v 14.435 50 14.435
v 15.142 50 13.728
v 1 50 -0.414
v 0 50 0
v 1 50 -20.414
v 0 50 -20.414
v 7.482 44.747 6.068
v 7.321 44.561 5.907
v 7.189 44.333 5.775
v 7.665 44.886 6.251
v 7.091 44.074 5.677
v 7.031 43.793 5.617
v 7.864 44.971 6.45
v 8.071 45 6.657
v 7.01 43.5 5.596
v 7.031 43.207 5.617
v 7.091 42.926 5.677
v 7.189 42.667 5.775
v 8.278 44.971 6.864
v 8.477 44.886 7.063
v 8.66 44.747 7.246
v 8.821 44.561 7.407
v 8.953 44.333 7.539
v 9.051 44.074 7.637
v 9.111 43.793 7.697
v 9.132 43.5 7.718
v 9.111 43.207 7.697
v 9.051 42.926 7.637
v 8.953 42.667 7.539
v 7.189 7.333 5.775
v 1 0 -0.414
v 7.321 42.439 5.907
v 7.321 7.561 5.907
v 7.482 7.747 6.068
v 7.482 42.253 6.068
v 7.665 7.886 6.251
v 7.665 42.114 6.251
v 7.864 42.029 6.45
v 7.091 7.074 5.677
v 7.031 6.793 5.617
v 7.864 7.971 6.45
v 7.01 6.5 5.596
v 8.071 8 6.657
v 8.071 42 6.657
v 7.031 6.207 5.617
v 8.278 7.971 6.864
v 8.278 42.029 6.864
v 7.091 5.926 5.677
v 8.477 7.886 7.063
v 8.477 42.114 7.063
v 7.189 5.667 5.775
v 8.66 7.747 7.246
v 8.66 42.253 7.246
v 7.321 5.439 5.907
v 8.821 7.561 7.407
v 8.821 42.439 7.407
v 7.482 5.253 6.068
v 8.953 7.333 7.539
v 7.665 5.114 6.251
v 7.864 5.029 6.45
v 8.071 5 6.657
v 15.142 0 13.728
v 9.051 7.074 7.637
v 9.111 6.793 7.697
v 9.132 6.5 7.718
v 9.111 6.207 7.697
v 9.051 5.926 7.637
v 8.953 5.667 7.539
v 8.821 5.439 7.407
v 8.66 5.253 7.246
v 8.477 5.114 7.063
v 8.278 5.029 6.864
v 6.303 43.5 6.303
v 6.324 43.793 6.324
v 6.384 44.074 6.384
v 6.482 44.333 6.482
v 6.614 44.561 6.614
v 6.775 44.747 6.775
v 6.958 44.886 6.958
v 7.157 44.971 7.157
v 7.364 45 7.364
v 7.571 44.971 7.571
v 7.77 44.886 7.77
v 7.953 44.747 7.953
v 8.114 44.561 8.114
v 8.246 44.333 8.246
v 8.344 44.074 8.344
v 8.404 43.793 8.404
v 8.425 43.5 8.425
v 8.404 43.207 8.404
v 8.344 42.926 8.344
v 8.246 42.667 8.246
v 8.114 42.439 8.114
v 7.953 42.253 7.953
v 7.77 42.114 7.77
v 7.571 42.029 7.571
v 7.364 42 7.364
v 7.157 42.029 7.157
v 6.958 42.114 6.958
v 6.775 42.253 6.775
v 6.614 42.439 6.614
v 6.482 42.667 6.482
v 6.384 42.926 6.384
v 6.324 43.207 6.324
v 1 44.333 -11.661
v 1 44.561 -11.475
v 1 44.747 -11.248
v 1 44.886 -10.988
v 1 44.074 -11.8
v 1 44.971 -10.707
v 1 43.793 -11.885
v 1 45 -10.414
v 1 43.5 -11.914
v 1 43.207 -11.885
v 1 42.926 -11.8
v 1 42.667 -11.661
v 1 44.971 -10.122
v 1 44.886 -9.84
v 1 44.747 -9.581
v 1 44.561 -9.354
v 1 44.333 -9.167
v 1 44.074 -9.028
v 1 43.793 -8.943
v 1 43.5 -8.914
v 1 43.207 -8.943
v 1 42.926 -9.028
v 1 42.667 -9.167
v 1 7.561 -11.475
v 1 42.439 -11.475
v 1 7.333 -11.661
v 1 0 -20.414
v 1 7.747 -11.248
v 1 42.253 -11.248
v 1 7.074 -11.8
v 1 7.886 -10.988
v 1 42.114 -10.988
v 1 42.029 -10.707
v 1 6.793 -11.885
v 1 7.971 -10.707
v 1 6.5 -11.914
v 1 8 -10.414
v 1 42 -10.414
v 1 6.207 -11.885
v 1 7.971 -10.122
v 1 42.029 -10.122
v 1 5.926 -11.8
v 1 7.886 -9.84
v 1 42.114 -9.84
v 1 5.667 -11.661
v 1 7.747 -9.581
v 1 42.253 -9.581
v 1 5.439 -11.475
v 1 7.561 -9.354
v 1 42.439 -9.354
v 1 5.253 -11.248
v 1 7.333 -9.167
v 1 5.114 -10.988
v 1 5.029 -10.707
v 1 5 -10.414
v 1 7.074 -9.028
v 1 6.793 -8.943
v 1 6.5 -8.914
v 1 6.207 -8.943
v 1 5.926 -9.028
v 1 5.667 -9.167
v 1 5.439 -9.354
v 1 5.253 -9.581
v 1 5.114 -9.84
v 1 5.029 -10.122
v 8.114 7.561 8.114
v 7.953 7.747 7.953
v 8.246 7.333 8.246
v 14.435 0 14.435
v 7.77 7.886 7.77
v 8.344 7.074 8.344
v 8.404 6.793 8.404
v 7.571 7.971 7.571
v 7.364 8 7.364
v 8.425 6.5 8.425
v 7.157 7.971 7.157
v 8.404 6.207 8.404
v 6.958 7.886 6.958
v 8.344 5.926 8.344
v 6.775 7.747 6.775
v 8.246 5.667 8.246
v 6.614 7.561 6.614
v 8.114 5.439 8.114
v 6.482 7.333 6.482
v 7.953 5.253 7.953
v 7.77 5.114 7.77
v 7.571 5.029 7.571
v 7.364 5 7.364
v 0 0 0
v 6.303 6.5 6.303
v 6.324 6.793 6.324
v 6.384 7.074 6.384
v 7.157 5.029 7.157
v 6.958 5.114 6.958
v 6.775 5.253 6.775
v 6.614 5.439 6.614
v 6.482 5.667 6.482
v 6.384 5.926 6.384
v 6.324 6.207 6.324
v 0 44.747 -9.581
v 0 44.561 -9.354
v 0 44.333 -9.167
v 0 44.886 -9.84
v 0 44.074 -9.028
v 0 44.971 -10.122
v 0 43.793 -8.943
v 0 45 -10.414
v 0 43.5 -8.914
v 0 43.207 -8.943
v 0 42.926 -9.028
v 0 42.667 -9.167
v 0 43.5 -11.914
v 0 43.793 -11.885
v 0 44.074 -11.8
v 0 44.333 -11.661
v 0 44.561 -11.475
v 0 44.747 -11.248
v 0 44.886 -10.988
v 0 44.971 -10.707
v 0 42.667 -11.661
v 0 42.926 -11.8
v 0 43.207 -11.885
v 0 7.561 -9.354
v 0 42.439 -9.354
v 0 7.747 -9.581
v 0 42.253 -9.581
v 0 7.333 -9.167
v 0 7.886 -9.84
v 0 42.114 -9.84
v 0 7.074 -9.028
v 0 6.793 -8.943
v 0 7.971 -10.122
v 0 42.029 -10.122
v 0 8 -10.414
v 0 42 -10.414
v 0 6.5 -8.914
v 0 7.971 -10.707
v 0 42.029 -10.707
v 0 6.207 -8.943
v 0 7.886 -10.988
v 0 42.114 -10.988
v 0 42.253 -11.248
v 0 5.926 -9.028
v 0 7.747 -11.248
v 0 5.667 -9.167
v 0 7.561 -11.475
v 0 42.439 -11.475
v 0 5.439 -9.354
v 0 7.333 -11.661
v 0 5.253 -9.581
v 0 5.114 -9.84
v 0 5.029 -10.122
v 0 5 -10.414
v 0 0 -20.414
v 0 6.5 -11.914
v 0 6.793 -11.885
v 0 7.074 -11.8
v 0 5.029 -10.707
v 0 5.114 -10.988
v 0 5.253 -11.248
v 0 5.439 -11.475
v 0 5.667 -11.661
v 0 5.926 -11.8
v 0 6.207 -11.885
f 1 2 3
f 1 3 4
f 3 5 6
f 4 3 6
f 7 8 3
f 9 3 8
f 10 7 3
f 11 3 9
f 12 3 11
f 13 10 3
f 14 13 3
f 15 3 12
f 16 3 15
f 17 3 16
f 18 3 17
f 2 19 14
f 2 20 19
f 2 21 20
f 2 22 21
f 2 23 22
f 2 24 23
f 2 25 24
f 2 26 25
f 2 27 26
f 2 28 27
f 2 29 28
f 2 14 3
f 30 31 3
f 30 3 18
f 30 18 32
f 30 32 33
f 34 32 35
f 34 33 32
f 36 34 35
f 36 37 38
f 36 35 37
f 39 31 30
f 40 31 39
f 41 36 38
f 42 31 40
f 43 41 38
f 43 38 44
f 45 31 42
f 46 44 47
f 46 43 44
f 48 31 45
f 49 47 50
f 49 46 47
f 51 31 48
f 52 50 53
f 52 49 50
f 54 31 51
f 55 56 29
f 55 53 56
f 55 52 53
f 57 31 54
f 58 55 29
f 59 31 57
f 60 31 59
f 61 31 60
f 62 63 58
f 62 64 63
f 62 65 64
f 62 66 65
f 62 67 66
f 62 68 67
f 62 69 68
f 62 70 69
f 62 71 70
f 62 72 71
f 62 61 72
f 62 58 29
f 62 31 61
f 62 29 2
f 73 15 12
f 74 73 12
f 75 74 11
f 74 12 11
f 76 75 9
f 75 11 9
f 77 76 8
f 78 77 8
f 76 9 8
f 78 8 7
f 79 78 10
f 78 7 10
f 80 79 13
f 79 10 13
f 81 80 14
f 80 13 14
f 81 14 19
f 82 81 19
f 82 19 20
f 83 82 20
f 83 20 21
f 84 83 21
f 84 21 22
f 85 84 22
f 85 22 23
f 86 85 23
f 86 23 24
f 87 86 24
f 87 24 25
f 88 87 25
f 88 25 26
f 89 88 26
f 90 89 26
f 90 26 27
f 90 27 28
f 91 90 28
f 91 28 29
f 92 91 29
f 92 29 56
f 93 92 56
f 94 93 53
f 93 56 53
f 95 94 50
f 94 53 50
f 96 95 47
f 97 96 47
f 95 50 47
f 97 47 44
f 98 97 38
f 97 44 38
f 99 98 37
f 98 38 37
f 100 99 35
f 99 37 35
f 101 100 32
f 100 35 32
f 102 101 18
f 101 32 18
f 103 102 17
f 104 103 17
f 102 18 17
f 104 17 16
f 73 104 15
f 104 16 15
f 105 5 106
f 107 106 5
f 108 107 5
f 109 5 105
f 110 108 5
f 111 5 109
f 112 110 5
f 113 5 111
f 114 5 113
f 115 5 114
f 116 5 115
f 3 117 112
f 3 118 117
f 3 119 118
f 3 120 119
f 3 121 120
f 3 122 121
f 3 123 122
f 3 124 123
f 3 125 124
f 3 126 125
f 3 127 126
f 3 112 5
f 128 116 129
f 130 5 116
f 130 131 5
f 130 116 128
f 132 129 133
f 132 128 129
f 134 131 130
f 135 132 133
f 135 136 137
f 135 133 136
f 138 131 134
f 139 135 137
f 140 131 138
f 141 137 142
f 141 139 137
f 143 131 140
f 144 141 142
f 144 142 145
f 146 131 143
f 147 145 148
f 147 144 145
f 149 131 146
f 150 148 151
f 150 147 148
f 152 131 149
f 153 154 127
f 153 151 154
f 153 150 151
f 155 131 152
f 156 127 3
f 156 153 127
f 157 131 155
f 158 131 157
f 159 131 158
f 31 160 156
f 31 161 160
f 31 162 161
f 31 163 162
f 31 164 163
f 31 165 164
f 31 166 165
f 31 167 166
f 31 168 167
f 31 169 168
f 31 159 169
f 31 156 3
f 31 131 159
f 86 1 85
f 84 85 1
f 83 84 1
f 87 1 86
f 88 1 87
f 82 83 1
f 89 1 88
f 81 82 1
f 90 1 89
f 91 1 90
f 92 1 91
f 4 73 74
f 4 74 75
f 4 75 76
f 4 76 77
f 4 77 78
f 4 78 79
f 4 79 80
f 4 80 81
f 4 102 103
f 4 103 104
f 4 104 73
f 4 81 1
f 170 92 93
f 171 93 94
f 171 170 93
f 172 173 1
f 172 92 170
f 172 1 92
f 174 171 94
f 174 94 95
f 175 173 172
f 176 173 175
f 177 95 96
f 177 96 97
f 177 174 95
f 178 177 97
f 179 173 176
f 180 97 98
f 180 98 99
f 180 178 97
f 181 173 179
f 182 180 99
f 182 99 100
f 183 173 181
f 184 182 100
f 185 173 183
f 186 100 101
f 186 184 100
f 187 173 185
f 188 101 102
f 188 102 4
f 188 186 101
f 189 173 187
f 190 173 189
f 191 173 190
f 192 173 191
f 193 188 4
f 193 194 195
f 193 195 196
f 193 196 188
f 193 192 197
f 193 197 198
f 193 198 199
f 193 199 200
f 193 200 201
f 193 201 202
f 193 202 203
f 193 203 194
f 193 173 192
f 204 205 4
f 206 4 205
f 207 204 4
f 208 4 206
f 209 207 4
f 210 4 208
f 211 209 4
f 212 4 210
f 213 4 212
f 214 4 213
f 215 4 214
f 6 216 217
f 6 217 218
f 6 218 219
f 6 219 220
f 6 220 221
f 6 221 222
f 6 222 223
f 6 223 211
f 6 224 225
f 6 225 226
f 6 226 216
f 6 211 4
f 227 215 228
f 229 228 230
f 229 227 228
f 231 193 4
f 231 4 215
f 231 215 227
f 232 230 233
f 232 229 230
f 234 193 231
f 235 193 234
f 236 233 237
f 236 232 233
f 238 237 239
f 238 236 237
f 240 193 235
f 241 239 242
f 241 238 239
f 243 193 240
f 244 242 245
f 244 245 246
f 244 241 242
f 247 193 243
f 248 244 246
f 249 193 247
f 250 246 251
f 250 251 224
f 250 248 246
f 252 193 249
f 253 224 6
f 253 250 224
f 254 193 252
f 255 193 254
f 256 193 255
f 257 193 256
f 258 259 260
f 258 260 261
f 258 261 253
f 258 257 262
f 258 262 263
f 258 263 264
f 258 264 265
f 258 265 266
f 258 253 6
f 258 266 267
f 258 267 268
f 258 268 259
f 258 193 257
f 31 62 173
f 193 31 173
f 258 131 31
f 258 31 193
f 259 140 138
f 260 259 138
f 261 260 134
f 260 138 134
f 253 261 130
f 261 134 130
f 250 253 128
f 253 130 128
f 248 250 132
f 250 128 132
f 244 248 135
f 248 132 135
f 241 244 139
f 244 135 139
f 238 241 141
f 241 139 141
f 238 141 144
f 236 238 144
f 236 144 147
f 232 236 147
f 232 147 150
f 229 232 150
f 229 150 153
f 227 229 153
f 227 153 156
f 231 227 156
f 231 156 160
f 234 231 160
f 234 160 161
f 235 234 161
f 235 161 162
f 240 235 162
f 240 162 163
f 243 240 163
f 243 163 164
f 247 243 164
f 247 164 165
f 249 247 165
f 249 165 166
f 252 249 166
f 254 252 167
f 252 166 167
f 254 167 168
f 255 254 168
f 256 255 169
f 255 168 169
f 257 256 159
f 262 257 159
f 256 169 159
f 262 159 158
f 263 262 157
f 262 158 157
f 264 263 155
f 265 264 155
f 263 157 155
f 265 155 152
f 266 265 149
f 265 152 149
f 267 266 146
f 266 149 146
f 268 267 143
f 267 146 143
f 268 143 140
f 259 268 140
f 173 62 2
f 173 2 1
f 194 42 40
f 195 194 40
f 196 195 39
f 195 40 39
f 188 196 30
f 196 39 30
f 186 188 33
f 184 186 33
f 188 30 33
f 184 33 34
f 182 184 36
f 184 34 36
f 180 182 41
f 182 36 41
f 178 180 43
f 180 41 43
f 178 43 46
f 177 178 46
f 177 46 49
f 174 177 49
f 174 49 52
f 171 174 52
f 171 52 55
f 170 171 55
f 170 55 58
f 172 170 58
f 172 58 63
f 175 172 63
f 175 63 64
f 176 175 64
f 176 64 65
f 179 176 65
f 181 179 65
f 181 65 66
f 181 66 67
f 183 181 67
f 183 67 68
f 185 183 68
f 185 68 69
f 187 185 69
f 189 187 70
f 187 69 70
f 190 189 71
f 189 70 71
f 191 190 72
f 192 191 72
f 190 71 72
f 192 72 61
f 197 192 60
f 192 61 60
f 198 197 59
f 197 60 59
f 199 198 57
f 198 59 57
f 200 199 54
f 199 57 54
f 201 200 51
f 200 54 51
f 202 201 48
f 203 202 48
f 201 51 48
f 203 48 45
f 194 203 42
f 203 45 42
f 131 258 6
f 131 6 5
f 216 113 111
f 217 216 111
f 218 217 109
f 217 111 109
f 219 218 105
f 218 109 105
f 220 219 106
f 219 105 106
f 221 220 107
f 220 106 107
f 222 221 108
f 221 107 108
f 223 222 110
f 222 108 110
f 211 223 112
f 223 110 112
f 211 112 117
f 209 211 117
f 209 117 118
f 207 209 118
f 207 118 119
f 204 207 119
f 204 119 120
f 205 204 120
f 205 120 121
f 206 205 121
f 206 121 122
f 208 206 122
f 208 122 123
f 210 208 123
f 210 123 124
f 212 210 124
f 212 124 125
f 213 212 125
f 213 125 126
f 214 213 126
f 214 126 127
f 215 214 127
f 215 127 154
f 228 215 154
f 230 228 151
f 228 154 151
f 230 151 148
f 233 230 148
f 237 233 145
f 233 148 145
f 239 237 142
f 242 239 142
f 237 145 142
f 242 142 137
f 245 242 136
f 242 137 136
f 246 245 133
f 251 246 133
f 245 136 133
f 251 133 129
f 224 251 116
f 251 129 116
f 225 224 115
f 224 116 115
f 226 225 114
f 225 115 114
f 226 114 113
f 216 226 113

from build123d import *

# Parameters (mm, degrees)
EXTRUSION1_DEPTH = 50
EXTRUSION2_REACH = 3
ESQUISSE2_R      = 1.5
EXTRUSION3_REACH = 13.207
ESQUISSE3_R      = 1.5


with BuildPart() as part:
    # Esquisse1 → Extrusion1 (new body)
    with BuildSketch(Plane(origin=(0, 0, 0), x_dir=(1, 0, 0), z_dir=(0, 1, 0))):
        Polygon((0, 0), (0, 20.414213562), (1, 20.414213562), (1, 0.414213562), (15.142135624, -13.727922061), (14.435028843, -14.435028843), align=None)
    extrude(amount=EXTRUSION1_DEPTH)

    # Esquisse2 → Extrusion2 (cut, up to next)
    with BuildSketch(Plane(origin=(1, 0, 0), x_dir=(0, 0, -1), z_dir=(1, 0, 0)), mode=Mode.PRIVATE) as extrusion2_sk1:
        with Locations((10.414213562, 6.5)):
            Circle(ESQUISSE2_R)
    extrusion2_tool1 = extrude(extrusion2_sk1.sketch, amount=-EXTRUSION2_REACH, mode=Mode.PRIVATE) & part.part
    add(extrusion2_tool1.solids().sort_by_distance((1, 6.5, -10.414214))[0], mode=Mode.SUBTRACT)
    # Esquisse2 → Extrusion2 (cut, up to next)
    with BuildSketch(Plane(origin=(1, 0, 0), x_dir=(0, 0, -1), z_dir=(1, 0, 0)), mode=Mode.PRIVATE) as extrusion2_sk2:
        with Locations((10.414213562, 43.5)):
            Circle(ESQUISSE2_R)
    extrusion2_tool2 = extrude(extrusion2_sk2.sketch, amount=-EXTRUSION2_REACH, mode=Mode.PRIVATE) & part.part
    add(extrusion2_tool2.solids().sort_by_distance((1, 43.5, -10.414214))[0], mode=Mode.SUBTRACT)

    # Esquisse3 → Extrusion3 (cut, up to next)
    with BuildSketch(Plane(origin=(0.707106781, 0, -0.707106781), x_dir=(-0.707106781, 0, -0.707106781), z_dir=(0.707106781, 0, -0.707106781)), mode=Mode.PRIVATE) as extrusion3_sk1:
        with Locations((-10.414213562, 43.5)):
            Circle(ESQUISSE3_R)
    extrusion3_tool1 = extrude(extrusion3_sk1.sketch, amount=-EXTRUSION3_REACH, mode=Mode.PRIVATE) & part.part
    add(extrusion3_tool1.solids().sort_by_distance((8.071068, 43.5, 6.656854))[0], mode=Mode.SUBTRACT)
    # Esquisse3 → Extrusion3 (cut, up to next)
    with BuildSketch(Plane(origin=(0.707106781, 0, -0.707106781), x_dir=(-0.707106781, 0, -0.707106781), z_dir=(0.707106781, 0, -0.707106781)), mode=Mode.PRIVATE) as extrusion3_sk2:
        with Locations((-10.414213562, 6.5)):
            Circle(ESQUISSE3_R)
    extrusion3_tool2 = extrude(extrusion3_sk2.sketch, amount=-EXTRUSION3_REACH, mode=Mode.PRIVATE) & part.part
    add(extrusion3_tool2.solids().sort_by_distance((8.071068, 6.5, 6.656854))[0], mode=Mode.SUBTRACT)


solid = part.part
